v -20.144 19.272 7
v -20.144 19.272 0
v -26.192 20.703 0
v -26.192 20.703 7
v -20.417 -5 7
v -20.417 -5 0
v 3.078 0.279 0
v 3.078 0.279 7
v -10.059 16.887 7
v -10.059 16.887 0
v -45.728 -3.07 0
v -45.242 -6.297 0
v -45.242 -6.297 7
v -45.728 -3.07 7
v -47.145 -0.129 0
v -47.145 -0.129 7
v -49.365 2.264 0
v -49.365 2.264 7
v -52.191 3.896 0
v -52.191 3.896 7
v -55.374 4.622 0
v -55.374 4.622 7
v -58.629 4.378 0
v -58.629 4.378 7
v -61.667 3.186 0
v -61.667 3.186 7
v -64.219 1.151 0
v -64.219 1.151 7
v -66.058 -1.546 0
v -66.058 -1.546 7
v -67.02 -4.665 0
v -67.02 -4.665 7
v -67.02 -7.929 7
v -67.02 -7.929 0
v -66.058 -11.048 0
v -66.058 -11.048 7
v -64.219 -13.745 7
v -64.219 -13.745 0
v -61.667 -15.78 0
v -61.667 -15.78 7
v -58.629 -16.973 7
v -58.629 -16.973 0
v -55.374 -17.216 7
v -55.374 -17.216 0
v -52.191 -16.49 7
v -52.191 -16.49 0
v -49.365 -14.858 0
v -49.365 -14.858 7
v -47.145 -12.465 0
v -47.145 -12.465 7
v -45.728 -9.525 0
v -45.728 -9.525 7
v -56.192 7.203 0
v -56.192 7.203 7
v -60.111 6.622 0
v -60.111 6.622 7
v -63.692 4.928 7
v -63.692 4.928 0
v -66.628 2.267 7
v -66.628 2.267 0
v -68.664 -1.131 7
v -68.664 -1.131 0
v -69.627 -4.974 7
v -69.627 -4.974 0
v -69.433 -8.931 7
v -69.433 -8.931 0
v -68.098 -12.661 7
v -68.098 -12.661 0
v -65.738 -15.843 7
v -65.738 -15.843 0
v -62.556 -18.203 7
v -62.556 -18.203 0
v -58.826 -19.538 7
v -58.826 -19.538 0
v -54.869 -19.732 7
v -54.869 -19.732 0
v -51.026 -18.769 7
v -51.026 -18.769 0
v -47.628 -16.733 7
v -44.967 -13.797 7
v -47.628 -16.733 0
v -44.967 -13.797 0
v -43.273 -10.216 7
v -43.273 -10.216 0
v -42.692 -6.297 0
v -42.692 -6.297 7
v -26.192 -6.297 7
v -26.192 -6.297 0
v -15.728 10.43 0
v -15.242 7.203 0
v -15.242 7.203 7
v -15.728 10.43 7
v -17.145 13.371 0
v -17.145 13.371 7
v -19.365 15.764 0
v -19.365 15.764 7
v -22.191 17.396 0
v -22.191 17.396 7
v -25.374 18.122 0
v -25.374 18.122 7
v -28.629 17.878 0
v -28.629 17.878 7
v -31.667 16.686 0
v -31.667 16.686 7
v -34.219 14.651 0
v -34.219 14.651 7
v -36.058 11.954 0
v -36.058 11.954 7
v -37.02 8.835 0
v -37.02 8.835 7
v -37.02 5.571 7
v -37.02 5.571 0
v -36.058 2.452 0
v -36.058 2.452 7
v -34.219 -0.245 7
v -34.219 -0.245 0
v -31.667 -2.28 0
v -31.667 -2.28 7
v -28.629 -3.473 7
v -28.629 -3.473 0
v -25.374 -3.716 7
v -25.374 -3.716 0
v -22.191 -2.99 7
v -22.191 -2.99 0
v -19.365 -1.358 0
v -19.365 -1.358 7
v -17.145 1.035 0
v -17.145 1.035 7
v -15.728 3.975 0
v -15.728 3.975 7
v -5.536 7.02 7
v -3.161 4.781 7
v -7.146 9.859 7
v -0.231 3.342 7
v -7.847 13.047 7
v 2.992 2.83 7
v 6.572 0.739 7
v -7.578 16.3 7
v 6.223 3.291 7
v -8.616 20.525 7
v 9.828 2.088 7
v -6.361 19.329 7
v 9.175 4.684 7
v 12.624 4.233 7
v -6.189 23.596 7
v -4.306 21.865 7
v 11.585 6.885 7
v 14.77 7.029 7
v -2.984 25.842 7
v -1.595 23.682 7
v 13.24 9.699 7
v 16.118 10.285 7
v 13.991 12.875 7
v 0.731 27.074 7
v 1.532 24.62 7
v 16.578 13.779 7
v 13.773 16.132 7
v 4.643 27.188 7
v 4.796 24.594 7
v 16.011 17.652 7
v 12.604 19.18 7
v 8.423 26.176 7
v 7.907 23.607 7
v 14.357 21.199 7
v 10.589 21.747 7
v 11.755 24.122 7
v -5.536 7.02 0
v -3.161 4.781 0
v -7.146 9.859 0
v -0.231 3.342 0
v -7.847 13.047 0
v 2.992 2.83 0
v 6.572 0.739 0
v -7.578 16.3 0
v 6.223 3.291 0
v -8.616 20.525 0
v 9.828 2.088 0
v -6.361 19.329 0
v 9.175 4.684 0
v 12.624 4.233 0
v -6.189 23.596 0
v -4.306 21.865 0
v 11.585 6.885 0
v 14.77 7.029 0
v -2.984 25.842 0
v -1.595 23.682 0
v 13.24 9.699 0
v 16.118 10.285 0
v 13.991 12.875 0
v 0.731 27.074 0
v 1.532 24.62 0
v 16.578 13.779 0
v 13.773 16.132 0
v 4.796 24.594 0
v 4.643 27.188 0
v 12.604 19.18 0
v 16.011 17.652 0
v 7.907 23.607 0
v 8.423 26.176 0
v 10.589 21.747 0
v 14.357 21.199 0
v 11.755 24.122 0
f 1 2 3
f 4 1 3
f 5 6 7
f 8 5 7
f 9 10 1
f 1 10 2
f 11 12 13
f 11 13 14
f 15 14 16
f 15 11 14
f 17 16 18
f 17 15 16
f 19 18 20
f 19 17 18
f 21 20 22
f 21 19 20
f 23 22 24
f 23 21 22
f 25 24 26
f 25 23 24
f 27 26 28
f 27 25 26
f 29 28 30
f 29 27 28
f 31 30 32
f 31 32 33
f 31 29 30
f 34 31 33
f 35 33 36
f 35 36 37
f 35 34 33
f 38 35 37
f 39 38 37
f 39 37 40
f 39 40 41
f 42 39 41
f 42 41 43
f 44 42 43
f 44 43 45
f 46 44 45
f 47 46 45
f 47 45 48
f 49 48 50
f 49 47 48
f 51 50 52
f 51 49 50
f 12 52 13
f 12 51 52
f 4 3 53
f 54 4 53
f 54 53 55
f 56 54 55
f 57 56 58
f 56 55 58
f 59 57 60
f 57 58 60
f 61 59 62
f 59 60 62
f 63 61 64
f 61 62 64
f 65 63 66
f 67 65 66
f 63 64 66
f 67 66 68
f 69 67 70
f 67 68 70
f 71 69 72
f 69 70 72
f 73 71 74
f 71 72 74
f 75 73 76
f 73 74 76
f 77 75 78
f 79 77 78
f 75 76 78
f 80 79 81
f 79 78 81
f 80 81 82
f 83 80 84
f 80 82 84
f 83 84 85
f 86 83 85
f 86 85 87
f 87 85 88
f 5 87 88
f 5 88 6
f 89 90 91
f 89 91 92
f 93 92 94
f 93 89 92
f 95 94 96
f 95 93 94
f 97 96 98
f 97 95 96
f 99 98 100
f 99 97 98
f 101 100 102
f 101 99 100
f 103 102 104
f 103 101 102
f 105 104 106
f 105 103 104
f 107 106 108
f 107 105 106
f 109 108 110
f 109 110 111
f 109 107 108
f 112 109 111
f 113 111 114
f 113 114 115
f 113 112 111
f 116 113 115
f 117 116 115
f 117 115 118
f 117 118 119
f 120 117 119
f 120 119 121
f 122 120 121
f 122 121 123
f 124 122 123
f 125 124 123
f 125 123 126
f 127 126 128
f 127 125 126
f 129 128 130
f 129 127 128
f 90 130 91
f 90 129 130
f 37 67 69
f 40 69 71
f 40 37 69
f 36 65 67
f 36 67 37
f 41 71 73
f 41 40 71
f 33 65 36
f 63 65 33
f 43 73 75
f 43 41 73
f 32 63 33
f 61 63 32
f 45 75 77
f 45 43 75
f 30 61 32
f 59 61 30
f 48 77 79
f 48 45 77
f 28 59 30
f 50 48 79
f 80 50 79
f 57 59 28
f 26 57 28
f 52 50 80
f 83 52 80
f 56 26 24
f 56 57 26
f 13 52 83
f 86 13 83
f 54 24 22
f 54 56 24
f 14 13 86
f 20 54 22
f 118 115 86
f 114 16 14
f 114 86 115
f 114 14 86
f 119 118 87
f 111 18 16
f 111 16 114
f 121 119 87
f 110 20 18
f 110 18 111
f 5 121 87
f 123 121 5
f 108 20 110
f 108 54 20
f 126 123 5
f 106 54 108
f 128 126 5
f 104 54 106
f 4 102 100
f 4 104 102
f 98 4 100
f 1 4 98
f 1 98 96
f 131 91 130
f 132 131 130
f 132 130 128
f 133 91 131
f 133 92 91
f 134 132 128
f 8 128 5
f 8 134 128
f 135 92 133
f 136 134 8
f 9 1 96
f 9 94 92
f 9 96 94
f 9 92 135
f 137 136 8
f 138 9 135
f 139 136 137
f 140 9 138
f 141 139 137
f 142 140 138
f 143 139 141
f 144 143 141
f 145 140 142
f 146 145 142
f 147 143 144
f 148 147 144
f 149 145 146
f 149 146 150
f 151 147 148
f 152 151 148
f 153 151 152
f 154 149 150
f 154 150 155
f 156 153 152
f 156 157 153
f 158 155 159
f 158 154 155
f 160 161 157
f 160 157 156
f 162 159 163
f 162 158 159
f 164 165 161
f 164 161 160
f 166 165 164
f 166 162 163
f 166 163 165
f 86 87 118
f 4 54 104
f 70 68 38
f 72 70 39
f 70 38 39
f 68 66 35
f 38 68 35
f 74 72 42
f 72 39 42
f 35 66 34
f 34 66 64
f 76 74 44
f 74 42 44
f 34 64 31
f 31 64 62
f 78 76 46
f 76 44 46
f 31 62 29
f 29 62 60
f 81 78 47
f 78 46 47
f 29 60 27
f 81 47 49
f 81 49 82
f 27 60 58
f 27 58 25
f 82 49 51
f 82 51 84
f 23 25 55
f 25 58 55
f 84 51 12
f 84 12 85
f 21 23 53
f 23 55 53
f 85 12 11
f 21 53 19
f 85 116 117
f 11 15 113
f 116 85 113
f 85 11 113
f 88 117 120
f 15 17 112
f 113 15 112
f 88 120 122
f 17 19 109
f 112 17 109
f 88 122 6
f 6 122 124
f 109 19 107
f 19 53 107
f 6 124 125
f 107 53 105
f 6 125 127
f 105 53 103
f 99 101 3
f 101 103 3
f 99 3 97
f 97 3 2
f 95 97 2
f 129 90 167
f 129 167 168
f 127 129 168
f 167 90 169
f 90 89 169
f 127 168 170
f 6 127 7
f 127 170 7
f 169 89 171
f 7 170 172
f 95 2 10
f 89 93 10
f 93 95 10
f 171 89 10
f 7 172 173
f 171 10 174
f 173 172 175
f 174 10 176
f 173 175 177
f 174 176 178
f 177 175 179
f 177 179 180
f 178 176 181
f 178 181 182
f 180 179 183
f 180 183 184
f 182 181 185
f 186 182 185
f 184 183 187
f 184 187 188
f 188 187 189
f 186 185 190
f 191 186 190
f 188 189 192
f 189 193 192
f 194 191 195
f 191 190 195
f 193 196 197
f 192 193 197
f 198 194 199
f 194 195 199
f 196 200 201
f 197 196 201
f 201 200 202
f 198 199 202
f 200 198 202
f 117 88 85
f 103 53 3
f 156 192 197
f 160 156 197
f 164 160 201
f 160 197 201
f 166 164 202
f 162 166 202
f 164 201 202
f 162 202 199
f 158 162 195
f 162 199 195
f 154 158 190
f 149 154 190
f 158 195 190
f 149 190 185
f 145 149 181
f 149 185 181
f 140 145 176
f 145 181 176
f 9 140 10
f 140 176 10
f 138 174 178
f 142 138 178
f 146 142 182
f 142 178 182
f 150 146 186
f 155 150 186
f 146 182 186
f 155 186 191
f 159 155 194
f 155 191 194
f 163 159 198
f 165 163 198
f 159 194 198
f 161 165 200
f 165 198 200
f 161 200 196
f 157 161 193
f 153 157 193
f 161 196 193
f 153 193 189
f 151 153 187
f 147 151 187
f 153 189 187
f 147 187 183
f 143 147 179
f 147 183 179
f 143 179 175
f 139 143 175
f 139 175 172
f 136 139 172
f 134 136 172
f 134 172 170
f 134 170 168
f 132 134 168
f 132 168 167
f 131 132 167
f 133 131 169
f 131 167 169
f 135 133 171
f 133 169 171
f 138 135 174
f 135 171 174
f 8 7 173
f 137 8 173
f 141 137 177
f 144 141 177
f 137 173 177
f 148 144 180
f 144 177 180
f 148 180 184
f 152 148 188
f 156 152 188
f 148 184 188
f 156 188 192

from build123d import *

# Parameters (mm, degrees)
F0_R     = 10.95
F1_DEPTH = 7


# Not quite as in the source:
# - a feature names something its author has since deleted; it is built from what else it names


with BuildPart() as f1:
    # F0 (on Top) → F1 (new body)
    with BuildSketch(Plane.XY):
        with BuildLine():
            ThreePointArc((-56.191941013, 7.2029190708), (-65.7378825591, -15.8430224752), (-42.691941013, -6.2970809292))
            ThreePointArc((-42.691941013, -6.2970809292), (-46.645999467, 3.2488606168), (-56.191941013, 7.2029190708))
        make_face()
        with Locations((-56.191941013, -6.2970809292)):
            Circle(F0_R, mode=Mode.SUBTRACT)
        with BuildLine():
            Line((-42.691941013, -6.2970809292), (-26.191941013, -6.2970809292))
            ThreePointArc((-26.191941013, -6.2970809292), (-38.5028813329, 1.6629959269), (-36.295891117, 16.156141524))
            Line((-36.295891117, 16.156141524), (-56.191941013, 7.2029190708))
            ThreePointArc((-56.191941013, 7.2029190708), (-46.645999467, 3.2488606168), (-42.691941013, -6.2970809292))
        make_face()
        with BuildLine():
            ThreePointArc((-20.4170961141, -4.9995874911), (-14.7855742353, -0.0182163615), (-12.691941013, 7.2029190708))
            ThreePointArc((-12.691941013, 7.2029190708), (-14.704995322, 14.295173909), (-20.1438045227, 19.2723036862))
            Line((-20.1438045227, 19.2723036862), (-26.191941013, 20.7029190708))
            Line((-26.191941013, 20.7029190708), (-36.295891117, 16.156141524))
            ThreePointArc((-36.295891117, 16.156141524), (-38.5028813329, 1.6629959269), (-26.191941013, -6.2970809292))
            Line((-26.191941013, -6.2970809292), (-20.4170961141, -4.9995874911))
        make_face()
        with Locations((-26.191941013, 7.2029190708)):
            Circle(F0_R, mode=Mode.SUBTRACT)
        with BuildLine():
            ThreePointArc((-20.1438045227, 19.2723036862), (-14.704995322, 14.295173909), (-12.691941013, 7.2029190708))
            ThreePointArc((-12.691941013, 7.2029190708), (-14.7855742353, -0.0182163615), (-20.4170961141, -4.9995874911))
            Line((-20.4170961141, -4.9995874911), (3.0783548298, 0.27937566))
            ThreePointArc((3.0783548298, 0.27937566), (-7.5094084371, 5.4038596161), (-10.0591238534, 16.8868913633))
            Line((-10.0591238534, 16.8868913633), (-20.1438045227, 19.2723036862))
        make_face()
        with BuildLine():
            ThreePointArc((16.5783548298, 13.77937566), (4.6426498429, 27.1884390543), (-10.0591238534, 16.8868913633))
            ThreePointArc((-10.0591238534, 16.8868913633), (-7.5094084371, 5.4038596161), (3.0783548298, 0.27937566))
            ThreePointArc((3.0783548298, 0.27937566), (12.6242963759, 4.233434114), (16.5783548298, 13.77937566))
        make_face()
        with BuildLine():
            ThreePointArc((14.0283548298, 13.77937566), (1.8095377637, 2.9031353513), (-7.5776001022, 16.2999161749))
            ThreePointArc((-7.5776001022, 16.2999161749), (4.347171896, 24.6556159687), (14.0283548298, 13.77937566))
        make_face(mode=Mode.SUBTRACT)
    extrude(amount=F1_DEPTH)


solid = f1.part
